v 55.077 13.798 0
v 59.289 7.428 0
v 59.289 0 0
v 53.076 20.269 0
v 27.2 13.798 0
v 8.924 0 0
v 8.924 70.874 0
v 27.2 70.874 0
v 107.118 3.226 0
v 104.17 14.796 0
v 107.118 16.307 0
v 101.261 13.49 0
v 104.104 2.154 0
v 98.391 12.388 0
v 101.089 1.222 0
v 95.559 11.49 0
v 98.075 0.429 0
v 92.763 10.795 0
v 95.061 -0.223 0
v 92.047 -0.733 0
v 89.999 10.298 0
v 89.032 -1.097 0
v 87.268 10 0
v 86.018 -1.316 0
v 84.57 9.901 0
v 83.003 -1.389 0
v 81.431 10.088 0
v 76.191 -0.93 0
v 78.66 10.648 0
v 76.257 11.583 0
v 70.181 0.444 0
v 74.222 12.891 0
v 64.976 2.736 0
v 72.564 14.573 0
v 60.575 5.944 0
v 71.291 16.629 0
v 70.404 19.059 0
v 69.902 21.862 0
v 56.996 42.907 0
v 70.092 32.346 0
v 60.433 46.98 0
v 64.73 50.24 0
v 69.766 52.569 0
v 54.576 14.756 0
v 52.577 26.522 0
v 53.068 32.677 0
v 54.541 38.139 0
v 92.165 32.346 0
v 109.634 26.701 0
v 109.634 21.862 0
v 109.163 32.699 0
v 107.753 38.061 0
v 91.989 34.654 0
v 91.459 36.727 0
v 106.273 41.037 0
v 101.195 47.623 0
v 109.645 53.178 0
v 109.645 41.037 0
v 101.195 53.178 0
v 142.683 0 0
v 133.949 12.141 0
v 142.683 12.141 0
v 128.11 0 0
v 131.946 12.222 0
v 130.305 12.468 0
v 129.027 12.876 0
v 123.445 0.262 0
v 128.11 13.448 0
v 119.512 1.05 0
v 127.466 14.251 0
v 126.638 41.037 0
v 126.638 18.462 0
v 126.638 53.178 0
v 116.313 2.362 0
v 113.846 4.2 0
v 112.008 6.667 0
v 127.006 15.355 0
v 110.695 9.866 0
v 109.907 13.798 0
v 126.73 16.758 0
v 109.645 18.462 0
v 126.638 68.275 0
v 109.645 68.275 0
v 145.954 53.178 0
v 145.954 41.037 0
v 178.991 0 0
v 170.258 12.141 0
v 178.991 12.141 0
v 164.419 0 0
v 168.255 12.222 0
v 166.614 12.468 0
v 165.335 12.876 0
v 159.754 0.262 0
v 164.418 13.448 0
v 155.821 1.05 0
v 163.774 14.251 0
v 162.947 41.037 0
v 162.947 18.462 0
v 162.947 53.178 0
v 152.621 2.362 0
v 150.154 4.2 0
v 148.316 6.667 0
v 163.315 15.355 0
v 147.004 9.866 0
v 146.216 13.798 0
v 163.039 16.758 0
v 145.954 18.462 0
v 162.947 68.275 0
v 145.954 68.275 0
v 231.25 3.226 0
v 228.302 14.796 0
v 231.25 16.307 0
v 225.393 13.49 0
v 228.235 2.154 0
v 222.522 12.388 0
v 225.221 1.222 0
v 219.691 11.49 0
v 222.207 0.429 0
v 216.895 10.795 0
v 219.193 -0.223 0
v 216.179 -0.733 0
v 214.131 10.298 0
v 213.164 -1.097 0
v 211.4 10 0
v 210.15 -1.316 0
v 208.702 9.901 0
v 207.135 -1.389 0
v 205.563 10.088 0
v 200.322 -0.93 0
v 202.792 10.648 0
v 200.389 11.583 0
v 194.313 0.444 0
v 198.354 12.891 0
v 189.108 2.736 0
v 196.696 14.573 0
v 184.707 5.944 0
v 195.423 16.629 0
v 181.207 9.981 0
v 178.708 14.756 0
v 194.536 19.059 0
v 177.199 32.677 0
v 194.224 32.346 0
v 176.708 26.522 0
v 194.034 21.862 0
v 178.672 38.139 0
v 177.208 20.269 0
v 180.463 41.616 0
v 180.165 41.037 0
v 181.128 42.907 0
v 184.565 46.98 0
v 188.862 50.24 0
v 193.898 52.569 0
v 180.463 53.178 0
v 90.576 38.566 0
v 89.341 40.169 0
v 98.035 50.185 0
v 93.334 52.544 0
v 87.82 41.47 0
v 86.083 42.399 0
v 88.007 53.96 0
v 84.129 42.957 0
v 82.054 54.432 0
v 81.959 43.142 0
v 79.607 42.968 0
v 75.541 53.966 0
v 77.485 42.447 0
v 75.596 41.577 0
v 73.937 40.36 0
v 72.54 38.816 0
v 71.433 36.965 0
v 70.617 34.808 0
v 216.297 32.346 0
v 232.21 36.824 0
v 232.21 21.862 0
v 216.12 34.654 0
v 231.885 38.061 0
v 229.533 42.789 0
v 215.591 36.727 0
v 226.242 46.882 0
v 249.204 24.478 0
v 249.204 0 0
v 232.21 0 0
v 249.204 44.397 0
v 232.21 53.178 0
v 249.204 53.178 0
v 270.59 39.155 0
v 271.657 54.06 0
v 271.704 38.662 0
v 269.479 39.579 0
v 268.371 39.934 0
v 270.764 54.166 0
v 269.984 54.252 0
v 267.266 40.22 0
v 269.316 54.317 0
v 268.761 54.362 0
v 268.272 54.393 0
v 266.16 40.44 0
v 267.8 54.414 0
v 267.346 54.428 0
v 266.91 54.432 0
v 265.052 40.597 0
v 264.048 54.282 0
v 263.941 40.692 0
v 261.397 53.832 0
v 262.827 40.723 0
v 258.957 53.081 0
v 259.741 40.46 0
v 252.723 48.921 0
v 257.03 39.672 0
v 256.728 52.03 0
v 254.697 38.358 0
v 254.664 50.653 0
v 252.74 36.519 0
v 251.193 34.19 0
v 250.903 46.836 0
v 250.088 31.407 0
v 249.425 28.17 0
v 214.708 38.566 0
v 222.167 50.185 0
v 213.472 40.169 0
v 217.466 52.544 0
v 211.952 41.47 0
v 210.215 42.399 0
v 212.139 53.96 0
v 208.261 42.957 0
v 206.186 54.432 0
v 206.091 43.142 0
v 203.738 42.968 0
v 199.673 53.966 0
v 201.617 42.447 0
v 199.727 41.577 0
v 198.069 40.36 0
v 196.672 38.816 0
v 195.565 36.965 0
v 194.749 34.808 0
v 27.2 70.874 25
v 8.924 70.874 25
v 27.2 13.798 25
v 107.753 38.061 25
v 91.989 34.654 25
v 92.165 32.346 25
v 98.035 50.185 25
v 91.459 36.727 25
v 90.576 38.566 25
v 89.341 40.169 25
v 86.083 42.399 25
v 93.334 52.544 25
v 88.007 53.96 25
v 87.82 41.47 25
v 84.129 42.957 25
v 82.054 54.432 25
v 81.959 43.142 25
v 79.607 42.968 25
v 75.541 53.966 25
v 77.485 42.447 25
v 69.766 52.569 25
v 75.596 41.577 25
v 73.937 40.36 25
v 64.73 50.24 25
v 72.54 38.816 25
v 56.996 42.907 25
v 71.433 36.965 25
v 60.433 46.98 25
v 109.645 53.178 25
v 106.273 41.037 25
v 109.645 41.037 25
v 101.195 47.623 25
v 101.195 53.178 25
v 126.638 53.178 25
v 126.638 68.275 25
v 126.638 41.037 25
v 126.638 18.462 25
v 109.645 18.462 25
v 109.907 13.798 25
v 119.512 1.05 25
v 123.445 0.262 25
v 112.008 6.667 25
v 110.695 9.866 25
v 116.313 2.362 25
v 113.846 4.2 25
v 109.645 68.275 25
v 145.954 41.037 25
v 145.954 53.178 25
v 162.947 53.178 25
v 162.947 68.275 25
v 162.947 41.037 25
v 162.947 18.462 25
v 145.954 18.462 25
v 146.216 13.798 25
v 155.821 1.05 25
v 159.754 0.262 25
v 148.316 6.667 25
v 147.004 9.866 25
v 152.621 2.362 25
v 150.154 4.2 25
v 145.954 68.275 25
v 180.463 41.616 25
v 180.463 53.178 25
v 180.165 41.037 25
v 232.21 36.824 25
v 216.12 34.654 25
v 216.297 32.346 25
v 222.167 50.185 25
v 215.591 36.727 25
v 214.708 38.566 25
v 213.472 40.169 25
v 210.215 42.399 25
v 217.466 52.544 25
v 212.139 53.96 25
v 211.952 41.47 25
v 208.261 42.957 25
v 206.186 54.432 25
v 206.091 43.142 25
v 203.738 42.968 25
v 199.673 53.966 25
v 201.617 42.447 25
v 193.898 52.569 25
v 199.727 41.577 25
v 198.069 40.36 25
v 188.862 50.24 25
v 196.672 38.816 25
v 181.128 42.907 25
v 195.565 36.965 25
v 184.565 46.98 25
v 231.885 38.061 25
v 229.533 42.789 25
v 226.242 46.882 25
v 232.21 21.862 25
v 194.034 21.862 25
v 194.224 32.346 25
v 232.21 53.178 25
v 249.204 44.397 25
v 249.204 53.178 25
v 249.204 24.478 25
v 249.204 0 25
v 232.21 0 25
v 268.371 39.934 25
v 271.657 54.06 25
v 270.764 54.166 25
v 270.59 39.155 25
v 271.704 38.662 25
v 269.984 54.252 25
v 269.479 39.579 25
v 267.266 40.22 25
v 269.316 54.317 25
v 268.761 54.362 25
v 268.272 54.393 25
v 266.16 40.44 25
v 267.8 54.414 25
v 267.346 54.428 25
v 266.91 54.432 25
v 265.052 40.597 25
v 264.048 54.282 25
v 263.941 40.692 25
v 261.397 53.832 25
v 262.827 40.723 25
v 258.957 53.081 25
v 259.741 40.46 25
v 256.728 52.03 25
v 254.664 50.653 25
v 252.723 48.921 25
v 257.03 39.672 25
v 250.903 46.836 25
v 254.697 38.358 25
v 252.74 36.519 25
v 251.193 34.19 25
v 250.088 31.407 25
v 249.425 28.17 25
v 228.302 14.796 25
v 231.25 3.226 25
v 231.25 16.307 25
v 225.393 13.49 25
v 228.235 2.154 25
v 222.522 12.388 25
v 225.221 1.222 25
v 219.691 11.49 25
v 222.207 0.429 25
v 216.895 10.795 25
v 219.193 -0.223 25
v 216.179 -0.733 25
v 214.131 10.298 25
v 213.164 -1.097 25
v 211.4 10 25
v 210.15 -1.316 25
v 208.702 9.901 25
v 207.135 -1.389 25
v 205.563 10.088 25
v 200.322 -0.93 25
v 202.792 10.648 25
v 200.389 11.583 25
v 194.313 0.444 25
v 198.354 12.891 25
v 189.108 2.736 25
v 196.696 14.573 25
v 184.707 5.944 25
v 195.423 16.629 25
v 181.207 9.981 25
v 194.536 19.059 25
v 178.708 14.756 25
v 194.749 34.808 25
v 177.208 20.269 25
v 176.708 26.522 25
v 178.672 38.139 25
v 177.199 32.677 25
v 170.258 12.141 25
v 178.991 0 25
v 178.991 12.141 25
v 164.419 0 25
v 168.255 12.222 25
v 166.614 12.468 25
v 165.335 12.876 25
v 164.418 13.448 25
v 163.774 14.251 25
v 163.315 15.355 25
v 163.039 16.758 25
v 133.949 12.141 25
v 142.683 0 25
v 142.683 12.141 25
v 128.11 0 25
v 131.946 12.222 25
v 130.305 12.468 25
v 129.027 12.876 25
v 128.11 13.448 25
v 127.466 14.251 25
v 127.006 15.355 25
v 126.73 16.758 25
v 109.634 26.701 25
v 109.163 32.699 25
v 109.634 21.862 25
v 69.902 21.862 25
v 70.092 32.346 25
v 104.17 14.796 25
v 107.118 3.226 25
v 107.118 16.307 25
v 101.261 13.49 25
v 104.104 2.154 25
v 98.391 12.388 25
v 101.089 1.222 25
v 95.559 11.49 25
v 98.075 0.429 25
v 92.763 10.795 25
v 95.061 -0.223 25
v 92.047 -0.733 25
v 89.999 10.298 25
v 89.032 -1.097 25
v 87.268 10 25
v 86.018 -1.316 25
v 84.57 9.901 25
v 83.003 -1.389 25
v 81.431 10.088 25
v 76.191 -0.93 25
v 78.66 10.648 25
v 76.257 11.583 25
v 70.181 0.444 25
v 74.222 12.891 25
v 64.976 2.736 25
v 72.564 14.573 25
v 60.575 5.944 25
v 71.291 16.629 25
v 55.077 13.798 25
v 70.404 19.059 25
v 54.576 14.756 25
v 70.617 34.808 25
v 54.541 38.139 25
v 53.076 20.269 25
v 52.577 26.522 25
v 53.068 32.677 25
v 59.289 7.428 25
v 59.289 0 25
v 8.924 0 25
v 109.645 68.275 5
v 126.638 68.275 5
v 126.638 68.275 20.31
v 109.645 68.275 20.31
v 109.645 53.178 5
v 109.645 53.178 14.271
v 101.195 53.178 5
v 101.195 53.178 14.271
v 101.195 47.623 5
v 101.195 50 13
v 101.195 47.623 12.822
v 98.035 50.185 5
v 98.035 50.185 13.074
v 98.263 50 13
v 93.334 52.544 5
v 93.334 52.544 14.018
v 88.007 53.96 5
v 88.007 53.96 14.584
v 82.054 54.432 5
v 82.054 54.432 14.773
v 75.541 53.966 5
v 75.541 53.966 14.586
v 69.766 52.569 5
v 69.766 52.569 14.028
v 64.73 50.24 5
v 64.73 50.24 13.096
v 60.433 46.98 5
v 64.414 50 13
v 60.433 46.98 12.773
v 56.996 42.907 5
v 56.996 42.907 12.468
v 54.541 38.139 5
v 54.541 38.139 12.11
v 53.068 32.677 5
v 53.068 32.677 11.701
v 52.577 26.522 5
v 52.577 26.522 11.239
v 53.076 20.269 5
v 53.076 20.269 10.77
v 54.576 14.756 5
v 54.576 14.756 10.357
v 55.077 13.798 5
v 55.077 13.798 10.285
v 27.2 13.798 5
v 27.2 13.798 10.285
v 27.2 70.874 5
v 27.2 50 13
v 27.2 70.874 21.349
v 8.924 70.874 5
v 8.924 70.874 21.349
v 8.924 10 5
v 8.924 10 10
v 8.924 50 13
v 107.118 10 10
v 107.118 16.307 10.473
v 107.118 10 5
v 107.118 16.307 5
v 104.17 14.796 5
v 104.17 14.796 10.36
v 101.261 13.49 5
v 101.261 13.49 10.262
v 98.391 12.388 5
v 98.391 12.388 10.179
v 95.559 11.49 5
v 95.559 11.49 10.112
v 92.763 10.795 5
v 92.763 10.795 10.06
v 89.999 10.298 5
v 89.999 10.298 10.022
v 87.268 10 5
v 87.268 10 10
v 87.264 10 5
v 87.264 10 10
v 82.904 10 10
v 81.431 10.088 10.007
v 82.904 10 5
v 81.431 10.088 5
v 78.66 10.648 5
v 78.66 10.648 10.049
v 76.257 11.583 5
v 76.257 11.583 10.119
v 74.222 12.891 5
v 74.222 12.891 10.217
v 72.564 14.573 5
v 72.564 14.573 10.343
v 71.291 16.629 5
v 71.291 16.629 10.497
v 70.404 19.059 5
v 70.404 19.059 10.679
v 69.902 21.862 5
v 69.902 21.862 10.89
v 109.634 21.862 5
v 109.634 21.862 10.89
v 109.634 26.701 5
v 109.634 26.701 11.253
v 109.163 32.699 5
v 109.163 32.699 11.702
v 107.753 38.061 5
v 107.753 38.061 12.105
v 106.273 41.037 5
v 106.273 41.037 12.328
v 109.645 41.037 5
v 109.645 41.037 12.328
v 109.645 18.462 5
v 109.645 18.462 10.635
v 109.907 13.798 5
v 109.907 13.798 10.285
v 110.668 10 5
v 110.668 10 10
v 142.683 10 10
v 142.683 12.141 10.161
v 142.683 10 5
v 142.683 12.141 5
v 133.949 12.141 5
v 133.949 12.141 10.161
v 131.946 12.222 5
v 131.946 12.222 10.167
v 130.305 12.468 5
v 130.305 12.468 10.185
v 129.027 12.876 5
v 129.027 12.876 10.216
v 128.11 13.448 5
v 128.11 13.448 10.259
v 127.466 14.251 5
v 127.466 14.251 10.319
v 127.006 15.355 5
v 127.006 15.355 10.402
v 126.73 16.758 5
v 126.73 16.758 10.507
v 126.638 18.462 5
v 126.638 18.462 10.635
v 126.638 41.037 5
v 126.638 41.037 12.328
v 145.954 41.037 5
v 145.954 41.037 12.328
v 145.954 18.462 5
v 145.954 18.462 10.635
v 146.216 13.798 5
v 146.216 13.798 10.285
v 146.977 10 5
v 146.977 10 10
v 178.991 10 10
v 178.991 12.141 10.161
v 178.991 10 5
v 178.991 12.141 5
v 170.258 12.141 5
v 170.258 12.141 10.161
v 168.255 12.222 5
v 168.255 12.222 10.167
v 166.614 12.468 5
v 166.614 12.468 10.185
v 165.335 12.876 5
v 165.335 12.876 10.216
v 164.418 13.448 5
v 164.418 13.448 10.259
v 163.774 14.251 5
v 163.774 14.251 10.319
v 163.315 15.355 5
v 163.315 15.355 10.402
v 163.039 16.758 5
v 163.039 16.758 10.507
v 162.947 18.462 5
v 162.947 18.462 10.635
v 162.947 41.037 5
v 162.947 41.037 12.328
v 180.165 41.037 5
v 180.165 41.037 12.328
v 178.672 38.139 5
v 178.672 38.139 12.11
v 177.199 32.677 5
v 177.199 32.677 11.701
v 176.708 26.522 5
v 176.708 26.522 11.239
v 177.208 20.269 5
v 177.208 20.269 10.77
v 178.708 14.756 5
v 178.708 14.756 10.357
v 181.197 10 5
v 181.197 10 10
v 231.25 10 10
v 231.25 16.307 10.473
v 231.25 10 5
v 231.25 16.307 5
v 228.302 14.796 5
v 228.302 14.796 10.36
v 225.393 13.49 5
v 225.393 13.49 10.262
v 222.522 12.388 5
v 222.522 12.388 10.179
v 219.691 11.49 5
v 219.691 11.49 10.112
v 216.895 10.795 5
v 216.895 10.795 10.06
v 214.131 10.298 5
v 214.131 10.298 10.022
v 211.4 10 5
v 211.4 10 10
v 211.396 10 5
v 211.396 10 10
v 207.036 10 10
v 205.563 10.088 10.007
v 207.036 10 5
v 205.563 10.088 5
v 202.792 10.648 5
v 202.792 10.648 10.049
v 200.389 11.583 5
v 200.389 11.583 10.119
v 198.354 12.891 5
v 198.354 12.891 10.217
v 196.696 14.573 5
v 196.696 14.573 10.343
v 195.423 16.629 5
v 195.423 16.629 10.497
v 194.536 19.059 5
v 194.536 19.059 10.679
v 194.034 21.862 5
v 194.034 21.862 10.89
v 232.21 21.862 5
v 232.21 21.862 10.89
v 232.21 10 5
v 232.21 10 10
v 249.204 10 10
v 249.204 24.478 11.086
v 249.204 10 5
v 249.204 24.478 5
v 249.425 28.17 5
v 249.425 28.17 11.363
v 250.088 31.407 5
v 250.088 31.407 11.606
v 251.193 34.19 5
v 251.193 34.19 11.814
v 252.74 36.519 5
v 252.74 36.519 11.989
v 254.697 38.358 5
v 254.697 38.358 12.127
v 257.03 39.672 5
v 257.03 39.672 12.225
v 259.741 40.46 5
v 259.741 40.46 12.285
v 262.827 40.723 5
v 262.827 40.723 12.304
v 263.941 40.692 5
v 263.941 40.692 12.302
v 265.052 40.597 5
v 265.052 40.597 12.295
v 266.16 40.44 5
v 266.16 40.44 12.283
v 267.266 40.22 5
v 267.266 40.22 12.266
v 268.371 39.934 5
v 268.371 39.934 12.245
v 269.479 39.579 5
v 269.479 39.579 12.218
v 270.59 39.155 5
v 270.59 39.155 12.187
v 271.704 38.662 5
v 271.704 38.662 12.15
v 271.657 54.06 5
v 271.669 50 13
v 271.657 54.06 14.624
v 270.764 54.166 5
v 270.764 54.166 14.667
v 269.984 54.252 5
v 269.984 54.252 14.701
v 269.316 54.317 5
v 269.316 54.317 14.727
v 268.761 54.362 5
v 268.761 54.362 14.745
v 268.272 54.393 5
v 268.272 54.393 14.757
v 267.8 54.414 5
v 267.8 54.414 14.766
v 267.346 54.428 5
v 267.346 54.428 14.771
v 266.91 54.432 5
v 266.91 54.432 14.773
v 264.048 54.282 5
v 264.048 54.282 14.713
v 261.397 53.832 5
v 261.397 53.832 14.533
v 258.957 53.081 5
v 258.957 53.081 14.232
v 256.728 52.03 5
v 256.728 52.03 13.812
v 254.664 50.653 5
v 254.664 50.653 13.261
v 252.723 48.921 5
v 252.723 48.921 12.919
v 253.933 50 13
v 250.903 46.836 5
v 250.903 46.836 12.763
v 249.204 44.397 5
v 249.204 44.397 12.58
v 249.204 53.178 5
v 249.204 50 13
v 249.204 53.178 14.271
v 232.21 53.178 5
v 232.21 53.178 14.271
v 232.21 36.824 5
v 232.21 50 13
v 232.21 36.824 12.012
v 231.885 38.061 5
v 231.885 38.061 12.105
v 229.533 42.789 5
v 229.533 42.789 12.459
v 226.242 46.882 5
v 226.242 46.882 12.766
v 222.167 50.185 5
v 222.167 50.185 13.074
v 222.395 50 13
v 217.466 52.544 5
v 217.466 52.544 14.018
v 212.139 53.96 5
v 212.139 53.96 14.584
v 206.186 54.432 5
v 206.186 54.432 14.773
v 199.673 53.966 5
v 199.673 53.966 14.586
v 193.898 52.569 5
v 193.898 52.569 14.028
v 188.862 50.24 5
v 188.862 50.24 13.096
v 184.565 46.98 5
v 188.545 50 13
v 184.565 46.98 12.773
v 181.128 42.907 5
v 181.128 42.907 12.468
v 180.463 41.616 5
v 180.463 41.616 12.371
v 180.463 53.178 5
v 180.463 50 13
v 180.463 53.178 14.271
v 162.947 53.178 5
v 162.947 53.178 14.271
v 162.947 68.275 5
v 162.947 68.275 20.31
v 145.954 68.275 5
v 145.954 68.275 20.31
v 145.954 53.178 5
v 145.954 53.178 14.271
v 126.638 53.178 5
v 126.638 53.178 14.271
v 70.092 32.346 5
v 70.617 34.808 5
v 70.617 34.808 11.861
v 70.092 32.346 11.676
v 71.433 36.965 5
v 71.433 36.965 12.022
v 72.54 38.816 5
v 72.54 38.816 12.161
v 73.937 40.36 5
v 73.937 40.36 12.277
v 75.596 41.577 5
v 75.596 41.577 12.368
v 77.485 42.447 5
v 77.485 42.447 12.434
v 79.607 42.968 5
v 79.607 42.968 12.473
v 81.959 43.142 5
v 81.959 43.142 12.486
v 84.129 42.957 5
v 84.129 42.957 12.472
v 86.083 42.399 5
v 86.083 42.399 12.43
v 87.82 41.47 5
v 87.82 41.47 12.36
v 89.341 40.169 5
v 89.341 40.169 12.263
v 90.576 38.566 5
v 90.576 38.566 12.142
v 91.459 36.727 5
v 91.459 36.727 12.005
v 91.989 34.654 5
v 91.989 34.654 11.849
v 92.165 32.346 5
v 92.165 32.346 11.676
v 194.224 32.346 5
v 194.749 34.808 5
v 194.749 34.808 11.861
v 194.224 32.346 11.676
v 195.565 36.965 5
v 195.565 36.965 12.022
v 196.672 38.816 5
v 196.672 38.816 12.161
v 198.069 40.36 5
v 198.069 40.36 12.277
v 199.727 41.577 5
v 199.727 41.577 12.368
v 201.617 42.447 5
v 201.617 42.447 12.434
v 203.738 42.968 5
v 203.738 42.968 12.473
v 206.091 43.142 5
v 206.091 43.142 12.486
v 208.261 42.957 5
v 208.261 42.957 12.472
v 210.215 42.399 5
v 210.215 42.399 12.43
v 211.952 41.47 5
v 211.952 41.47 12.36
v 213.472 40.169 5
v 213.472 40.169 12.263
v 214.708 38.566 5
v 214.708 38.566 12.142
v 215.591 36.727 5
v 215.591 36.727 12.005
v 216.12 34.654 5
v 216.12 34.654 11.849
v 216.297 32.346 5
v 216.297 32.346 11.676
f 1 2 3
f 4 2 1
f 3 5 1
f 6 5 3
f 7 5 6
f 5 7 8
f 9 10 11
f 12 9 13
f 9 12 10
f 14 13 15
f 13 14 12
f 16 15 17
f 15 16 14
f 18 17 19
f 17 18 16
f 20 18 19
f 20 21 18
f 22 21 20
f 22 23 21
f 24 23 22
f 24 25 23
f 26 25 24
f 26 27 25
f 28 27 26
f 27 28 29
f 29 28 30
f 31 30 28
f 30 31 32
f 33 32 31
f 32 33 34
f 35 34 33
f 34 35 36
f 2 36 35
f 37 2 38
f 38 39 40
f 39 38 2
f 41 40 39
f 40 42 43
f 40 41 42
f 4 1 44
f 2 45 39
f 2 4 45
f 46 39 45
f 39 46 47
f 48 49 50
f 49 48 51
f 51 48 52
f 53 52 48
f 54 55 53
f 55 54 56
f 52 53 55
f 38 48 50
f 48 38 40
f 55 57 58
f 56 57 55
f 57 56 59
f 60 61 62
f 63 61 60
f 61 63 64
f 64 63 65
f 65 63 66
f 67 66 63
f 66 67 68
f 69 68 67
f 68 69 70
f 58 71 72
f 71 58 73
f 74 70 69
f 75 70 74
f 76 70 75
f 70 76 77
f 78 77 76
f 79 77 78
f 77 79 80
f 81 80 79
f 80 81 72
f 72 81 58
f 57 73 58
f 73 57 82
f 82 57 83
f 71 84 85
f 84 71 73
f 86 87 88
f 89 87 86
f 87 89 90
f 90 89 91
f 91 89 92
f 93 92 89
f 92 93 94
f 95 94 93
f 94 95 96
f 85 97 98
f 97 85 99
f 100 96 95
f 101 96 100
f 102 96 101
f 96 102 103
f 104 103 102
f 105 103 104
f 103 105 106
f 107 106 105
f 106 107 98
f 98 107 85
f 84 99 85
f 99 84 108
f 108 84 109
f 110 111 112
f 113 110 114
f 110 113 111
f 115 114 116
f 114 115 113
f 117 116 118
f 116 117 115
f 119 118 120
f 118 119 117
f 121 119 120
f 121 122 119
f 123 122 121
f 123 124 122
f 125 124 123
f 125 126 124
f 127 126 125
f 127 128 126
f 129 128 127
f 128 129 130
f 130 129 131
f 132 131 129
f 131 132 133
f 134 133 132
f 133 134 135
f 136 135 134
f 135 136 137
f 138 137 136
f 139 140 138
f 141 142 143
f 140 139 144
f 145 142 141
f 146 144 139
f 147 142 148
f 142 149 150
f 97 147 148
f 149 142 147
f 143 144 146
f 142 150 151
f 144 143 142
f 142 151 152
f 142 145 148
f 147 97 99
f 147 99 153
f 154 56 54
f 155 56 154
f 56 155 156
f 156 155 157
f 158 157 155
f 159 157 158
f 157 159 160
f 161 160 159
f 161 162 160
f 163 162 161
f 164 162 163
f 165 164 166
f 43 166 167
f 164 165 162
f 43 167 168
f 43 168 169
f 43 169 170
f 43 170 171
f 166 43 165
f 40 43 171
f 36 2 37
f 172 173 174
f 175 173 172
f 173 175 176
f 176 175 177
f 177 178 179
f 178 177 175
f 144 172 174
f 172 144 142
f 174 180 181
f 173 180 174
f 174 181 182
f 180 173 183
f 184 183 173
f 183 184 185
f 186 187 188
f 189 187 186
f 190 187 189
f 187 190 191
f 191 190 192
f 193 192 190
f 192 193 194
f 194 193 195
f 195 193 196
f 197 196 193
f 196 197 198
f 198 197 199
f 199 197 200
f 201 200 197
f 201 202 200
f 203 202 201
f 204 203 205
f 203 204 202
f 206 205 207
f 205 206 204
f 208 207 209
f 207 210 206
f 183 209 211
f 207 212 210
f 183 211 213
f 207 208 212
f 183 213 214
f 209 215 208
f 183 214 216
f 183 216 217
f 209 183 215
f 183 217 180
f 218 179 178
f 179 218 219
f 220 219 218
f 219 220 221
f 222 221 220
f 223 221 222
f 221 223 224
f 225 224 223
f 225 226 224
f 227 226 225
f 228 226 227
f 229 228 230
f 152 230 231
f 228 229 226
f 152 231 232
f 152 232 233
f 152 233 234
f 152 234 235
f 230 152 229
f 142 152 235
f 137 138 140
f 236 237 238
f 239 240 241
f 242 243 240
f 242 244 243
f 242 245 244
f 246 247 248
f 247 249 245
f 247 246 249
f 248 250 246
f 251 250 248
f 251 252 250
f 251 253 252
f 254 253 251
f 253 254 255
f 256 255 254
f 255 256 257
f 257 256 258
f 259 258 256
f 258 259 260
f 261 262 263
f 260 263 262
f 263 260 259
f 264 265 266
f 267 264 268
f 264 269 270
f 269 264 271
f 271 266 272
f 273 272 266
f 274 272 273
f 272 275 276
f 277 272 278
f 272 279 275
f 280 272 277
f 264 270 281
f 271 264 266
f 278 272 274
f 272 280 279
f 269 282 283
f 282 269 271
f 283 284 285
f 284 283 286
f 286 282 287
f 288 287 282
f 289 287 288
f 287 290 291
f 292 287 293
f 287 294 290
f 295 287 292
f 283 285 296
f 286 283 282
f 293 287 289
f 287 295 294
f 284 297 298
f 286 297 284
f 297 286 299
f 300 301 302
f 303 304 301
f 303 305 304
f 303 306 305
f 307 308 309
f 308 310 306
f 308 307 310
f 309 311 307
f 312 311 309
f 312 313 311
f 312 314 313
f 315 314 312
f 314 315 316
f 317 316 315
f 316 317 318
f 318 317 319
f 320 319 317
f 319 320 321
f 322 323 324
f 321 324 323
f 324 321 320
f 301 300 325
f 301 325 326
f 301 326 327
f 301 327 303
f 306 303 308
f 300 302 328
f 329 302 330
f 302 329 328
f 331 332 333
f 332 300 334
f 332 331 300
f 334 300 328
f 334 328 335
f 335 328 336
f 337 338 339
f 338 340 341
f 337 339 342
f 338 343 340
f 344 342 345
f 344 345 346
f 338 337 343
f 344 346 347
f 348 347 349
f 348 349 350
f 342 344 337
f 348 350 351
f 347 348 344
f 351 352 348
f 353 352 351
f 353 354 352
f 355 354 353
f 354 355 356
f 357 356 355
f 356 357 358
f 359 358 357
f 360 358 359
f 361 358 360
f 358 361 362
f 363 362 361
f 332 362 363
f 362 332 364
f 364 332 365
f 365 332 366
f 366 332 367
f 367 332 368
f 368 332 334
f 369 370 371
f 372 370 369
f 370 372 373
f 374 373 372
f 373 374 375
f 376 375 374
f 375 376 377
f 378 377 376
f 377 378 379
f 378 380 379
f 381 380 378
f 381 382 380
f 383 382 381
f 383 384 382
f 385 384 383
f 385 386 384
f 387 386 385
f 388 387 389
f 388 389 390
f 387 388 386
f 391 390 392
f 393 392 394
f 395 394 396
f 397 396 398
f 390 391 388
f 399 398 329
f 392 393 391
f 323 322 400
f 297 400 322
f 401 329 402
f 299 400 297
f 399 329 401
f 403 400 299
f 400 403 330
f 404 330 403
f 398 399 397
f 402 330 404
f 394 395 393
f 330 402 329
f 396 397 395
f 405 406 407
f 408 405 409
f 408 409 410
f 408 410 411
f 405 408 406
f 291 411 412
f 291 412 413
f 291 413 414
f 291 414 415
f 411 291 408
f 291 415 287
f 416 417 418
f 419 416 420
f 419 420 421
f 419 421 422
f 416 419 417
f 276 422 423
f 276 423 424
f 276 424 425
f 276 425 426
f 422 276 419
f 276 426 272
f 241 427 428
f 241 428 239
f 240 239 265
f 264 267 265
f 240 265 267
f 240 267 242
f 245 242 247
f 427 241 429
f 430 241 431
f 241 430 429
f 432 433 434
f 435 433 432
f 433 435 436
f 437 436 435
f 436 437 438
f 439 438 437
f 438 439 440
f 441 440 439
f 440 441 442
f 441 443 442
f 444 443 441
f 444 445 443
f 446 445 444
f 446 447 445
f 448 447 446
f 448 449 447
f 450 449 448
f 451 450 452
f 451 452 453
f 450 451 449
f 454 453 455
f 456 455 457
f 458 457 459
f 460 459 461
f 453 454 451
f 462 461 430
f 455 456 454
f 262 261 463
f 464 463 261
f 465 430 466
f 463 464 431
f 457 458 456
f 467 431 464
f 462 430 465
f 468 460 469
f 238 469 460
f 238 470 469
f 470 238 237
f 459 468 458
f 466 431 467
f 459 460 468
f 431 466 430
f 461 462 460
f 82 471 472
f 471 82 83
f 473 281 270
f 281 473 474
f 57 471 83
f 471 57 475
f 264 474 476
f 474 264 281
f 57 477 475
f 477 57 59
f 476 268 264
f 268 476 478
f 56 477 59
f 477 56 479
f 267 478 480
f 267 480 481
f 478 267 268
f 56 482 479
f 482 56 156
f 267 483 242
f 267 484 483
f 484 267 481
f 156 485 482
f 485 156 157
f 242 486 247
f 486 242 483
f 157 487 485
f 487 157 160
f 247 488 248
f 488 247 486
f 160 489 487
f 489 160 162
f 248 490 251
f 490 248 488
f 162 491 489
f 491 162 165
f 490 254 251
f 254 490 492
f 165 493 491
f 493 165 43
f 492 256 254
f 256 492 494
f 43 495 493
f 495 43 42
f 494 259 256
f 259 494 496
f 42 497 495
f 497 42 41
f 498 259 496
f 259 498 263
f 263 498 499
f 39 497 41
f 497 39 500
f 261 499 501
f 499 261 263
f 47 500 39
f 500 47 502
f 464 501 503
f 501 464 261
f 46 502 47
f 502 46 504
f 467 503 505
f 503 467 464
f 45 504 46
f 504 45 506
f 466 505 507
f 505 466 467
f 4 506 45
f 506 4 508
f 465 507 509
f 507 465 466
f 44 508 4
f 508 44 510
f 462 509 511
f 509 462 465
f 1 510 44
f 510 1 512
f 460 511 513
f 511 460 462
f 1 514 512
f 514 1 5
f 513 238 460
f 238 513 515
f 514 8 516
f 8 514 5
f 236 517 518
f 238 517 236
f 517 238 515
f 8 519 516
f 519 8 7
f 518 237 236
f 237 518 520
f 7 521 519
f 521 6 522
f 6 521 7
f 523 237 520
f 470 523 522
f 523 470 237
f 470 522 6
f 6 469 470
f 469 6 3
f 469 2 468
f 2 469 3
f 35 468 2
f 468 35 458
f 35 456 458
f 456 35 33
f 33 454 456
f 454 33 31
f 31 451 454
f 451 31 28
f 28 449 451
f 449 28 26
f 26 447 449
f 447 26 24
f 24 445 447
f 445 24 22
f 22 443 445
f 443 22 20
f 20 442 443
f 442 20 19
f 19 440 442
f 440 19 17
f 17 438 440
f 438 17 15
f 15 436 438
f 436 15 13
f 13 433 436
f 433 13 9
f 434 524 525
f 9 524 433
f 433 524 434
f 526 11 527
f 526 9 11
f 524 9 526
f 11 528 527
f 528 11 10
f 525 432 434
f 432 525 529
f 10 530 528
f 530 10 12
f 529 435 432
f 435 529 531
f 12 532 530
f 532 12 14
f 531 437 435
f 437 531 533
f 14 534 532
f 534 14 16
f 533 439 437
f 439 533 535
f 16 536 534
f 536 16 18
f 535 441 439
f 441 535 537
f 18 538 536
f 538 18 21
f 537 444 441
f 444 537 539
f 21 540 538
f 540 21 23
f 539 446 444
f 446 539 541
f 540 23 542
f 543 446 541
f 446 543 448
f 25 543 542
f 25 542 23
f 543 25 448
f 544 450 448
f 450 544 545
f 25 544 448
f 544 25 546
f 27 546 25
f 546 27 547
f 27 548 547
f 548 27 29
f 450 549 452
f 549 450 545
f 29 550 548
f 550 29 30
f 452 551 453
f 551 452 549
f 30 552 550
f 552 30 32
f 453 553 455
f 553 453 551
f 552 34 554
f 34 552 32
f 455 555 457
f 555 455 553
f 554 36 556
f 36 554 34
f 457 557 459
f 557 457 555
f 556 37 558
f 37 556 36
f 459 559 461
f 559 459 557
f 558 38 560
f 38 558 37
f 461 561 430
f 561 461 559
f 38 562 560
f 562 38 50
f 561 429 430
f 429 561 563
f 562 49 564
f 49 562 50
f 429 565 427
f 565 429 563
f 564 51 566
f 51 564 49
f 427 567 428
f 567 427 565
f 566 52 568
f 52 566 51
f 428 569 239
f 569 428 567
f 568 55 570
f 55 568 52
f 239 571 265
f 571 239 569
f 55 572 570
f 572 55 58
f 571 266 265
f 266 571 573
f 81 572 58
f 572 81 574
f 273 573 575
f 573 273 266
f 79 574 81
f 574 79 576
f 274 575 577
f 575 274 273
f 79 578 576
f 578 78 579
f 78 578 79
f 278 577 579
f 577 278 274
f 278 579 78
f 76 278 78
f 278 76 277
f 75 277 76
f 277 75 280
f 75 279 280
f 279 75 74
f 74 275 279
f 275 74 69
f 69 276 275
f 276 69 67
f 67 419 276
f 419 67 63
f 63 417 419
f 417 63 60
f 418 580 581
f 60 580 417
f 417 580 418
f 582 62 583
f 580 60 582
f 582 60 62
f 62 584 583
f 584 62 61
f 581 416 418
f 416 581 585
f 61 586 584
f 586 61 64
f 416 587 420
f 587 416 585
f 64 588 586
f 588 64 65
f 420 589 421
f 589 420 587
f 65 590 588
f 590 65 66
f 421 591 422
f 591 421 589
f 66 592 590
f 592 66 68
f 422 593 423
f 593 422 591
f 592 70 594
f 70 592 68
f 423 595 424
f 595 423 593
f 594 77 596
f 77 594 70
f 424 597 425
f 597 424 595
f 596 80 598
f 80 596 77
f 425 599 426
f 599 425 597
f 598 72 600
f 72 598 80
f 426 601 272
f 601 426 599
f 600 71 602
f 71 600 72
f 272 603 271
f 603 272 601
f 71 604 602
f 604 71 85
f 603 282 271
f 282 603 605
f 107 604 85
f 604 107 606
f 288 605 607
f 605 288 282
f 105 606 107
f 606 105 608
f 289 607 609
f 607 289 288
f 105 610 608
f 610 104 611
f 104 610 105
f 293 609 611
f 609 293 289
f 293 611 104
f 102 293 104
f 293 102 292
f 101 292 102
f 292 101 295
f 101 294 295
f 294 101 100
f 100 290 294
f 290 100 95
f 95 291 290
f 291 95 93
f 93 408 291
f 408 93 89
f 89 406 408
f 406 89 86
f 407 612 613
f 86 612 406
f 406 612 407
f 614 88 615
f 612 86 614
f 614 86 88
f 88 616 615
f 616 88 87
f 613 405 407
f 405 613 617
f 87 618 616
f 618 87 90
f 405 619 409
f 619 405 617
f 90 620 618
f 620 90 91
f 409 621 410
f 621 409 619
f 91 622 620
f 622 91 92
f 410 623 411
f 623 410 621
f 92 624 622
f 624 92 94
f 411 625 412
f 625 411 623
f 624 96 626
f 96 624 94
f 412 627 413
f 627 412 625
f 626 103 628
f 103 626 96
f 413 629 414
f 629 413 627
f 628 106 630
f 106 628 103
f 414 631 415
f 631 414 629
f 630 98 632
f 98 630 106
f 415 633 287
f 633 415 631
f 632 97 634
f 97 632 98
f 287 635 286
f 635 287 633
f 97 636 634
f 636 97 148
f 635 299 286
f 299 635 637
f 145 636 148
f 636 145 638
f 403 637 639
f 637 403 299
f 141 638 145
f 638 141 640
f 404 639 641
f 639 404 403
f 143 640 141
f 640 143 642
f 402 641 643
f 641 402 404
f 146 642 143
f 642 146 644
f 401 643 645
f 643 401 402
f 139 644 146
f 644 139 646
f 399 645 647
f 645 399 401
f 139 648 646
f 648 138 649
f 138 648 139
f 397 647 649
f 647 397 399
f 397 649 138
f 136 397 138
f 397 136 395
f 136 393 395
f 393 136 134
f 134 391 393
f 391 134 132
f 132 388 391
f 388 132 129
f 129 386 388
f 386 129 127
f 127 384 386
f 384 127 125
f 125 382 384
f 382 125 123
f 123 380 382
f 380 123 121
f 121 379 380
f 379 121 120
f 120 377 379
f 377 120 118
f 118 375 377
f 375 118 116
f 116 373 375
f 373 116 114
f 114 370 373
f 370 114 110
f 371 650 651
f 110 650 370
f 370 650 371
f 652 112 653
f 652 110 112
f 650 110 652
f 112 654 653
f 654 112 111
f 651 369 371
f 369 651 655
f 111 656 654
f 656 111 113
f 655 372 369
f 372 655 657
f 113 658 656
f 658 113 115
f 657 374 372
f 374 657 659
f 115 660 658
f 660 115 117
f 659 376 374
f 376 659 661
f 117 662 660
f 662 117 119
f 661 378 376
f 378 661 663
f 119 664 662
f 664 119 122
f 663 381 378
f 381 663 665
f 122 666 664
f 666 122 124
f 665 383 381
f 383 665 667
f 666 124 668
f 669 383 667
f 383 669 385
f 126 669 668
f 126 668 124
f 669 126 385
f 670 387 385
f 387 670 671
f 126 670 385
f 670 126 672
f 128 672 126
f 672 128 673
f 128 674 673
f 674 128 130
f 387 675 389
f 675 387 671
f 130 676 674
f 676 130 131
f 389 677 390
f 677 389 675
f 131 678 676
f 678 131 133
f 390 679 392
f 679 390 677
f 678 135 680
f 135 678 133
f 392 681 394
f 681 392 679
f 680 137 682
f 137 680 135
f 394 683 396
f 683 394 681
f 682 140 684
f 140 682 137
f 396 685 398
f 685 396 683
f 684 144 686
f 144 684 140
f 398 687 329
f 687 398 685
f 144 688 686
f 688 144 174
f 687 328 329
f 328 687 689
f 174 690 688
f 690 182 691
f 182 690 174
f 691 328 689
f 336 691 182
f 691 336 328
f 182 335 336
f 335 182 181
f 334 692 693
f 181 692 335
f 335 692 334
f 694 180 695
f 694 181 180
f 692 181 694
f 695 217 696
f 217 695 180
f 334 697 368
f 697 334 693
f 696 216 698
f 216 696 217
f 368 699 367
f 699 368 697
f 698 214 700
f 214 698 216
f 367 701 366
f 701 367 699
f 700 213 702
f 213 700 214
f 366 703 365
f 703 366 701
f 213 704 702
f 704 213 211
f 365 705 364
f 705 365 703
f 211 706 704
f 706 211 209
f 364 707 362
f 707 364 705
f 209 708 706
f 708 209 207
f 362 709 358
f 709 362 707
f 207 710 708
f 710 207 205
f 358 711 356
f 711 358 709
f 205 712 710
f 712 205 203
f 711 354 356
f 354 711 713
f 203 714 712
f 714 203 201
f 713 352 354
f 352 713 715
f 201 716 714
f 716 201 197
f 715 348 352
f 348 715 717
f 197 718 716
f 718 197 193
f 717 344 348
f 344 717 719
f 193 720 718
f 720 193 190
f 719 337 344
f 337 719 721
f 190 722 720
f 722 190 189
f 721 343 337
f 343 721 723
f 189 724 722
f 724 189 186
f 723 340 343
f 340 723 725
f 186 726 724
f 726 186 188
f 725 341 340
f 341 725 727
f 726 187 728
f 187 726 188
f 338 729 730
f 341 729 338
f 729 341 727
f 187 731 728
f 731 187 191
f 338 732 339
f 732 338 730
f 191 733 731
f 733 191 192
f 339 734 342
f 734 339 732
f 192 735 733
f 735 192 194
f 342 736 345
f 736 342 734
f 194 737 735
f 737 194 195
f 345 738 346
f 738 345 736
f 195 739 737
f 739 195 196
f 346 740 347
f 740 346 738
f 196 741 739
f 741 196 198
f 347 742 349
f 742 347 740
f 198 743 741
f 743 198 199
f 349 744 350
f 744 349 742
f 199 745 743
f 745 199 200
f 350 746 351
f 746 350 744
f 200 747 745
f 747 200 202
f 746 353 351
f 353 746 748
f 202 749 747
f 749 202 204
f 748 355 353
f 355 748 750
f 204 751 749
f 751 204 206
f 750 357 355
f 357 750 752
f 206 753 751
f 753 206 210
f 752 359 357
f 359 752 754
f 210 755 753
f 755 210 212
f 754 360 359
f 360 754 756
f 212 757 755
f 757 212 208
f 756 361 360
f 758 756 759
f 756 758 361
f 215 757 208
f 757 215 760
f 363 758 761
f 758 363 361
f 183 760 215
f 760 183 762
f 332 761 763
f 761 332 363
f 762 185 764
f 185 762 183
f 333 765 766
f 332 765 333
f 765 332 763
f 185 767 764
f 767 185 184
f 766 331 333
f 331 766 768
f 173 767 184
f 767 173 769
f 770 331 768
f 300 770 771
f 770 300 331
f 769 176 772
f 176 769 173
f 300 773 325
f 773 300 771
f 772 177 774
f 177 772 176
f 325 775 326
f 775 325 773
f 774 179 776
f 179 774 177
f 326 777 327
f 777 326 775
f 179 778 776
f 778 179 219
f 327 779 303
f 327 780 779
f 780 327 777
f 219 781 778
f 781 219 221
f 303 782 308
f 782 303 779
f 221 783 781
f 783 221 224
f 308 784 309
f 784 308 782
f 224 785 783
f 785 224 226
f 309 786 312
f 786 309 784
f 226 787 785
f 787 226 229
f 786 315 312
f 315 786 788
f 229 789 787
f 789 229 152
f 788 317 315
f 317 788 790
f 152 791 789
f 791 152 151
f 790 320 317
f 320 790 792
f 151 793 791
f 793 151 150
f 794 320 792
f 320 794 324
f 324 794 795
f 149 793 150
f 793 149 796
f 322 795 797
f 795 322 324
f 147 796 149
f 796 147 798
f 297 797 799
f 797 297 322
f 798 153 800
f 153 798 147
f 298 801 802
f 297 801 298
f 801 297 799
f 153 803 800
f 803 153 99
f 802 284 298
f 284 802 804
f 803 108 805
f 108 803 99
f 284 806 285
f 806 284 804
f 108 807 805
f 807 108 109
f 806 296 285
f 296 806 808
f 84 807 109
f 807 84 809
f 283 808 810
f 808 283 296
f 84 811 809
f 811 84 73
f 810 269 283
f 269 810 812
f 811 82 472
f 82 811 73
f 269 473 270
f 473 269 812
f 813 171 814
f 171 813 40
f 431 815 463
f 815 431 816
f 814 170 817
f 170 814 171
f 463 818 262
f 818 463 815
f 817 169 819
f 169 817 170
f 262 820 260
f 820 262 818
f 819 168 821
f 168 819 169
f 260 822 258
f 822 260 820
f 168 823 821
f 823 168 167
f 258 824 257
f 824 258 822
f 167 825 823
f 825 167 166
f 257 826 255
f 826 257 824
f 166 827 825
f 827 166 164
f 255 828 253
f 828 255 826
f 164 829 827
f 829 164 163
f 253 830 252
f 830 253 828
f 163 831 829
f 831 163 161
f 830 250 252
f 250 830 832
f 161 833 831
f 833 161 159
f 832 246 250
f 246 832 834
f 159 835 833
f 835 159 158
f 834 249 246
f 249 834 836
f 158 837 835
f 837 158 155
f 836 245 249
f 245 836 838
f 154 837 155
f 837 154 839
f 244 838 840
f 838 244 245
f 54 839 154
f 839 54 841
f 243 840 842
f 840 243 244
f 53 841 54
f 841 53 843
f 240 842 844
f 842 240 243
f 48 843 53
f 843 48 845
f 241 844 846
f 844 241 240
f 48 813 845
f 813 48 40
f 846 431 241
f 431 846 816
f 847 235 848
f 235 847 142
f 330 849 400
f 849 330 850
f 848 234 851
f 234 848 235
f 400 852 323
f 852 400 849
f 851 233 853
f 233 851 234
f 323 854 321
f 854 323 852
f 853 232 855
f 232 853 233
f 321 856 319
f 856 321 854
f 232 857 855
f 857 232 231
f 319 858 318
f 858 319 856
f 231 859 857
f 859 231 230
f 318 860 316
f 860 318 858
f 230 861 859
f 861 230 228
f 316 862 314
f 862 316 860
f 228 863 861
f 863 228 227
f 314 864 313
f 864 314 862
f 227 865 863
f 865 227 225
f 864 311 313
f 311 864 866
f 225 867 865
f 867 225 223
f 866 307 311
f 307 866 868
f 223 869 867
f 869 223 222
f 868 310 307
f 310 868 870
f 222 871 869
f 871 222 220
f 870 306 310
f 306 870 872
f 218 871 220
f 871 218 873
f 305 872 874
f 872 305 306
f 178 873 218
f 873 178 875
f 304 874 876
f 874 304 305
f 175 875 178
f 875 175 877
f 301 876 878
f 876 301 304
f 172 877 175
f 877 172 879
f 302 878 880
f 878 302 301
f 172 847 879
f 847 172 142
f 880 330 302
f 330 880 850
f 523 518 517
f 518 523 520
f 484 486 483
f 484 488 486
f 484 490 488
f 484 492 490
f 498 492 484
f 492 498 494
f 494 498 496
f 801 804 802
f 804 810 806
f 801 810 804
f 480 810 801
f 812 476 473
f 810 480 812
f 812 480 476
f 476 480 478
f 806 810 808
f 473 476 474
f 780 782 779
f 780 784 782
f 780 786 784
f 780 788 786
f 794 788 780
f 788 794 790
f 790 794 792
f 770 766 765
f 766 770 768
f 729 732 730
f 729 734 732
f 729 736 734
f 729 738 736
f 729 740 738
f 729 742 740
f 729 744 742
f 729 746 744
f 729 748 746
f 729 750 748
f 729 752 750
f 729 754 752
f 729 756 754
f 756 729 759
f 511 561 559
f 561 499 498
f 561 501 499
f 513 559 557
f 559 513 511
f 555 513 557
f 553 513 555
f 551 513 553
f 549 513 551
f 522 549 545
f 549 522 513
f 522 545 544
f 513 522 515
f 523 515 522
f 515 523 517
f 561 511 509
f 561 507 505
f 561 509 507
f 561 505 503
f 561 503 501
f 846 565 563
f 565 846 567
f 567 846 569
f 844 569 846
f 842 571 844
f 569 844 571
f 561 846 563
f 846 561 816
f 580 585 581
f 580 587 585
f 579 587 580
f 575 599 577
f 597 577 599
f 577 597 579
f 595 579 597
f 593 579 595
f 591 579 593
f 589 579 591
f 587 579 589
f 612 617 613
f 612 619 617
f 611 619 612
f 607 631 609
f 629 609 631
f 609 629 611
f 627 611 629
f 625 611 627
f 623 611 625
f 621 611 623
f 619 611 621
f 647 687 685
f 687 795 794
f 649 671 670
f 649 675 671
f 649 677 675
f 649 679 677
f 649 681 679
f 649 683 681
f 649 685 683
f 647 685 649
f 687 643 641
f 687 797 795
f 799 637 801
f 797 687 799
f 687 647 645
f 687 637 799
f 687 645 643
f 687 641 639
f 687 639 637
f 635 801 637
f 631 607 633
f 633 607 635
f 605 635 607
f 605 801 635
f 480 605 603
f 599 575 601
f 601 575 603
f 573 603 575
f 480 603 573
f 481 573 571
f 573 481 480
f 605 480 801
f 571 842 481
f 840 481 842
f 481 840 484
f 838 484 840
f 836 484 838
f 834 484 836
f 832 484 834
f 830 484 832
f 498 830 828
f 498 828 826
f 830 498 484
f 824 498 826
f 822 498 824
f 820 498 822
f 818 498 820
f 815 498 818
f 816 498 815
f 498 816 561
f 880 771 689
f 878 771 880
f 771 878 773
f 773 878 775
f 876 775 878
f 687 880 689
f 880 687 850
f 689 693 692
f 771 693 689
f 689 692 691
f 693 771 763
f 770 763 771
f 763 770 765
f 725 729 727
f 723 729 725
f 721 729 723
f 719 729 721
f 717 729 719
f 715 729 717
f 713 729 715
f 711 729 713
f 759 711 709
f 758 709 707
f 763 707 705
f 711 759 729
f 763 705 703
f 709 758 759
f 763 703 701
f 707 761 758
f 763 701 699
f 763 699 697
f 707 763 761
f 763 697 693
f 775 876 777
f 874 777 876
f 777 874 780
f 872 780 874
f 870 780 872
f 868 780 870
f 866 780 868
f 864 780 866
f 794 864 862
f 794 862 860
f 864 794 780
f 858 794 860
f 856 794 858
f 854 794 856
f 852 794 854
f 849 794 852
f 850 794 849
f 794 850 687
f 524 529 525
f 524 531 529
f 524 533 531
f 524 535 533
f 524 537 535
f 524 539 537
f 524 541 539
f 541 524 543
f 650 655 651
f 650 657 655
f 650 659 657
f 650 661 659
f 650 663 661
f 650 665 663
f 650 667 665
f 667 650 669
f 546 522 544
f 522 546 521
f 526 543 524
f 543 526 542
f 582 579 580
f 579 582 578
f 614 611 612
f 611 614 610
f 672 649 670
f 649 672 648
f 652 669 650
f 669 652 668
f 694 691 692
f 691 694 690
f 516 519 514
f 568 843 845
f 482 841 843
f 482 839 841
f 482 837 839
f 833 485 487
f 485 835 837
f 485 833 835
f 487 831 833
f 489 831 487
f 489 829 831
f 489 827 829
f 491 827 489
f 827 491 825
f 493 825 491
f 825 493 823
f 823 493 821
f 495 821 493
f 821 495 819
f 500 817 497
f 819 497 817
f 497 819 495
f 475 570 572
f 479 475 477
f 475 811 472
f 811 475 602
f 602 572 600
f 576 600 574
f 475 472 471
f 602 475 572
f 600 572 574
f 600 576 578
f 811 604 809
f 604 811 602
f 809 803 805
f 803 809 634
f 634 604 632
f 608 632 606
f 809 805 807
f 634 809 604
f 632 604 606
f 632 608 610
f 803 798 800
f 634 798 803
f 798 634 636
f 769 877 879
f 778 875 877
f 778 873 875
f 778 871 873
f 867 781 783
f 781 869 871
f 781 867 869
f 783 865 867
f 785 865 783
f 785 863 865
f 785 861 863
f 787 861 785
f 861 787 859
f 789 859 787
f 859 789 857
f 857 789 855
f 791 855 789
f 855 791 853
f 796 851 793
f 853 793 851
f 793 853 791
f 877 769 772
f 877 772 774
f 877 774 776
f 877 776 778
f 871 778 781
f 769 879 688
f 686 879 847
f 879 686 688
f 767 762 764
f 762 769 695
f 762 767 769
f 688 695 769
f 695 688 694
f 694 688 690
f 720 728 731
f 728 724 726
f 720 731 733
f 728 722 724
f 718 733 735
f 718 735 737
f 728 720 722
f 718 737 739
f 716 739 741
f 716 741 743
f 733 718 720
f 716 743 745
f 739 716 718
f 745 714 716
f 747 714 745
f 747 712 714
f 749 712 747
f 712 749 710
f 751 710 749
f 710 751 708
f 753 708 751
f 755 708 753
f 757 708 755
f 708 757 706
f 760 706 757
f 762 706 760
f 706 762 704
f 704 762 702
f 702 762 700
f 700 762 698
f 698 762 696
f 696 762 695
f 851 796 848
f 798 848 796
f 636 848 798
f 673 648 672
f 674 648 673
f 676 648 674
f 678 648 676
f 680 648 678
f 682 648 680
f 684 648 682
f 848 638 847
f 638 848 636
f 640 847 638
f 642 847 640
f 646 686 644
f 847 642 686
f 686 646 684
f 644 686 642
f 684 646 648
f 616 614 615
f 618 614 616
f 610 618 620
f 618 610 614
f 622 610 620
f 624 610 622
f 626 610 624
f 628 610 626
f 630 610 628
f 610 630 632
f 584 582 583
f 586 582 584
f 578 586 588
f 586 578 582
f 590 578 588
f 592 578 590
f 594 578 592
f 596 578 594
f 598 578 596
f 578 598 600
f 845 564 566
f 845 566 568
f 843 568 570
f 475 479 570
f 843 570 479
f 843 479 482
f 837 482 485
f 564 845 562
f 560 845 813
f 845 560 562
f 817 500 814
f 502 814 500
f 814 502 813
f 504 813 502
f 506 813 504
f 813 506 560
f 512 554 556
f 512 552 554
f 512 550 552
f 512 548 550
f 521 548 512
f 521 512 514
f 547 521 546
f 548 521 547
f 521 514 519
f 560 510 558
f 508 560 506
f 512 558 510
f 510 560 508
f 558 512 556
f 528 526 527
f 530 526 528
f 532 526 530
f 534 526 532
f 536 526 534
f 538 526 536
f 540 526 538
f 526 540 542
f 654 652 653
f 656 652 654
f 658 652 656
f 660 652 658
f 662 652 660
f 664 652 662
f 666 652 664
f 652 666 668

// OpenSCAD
text = "Letter";

difference(){
linear_extrude(height = 25, center = false){
text(text, font = "Impact:style=Bold",spacing =0.8, size = 70);
}


#translate([-10,10,5])  rotate(a=[0,90,0]) 
linear_extrude(height = 2000){
 polygon([[0,0], [-5,0], [-8,40], [-20,70], [0, 70]]);
}
}
